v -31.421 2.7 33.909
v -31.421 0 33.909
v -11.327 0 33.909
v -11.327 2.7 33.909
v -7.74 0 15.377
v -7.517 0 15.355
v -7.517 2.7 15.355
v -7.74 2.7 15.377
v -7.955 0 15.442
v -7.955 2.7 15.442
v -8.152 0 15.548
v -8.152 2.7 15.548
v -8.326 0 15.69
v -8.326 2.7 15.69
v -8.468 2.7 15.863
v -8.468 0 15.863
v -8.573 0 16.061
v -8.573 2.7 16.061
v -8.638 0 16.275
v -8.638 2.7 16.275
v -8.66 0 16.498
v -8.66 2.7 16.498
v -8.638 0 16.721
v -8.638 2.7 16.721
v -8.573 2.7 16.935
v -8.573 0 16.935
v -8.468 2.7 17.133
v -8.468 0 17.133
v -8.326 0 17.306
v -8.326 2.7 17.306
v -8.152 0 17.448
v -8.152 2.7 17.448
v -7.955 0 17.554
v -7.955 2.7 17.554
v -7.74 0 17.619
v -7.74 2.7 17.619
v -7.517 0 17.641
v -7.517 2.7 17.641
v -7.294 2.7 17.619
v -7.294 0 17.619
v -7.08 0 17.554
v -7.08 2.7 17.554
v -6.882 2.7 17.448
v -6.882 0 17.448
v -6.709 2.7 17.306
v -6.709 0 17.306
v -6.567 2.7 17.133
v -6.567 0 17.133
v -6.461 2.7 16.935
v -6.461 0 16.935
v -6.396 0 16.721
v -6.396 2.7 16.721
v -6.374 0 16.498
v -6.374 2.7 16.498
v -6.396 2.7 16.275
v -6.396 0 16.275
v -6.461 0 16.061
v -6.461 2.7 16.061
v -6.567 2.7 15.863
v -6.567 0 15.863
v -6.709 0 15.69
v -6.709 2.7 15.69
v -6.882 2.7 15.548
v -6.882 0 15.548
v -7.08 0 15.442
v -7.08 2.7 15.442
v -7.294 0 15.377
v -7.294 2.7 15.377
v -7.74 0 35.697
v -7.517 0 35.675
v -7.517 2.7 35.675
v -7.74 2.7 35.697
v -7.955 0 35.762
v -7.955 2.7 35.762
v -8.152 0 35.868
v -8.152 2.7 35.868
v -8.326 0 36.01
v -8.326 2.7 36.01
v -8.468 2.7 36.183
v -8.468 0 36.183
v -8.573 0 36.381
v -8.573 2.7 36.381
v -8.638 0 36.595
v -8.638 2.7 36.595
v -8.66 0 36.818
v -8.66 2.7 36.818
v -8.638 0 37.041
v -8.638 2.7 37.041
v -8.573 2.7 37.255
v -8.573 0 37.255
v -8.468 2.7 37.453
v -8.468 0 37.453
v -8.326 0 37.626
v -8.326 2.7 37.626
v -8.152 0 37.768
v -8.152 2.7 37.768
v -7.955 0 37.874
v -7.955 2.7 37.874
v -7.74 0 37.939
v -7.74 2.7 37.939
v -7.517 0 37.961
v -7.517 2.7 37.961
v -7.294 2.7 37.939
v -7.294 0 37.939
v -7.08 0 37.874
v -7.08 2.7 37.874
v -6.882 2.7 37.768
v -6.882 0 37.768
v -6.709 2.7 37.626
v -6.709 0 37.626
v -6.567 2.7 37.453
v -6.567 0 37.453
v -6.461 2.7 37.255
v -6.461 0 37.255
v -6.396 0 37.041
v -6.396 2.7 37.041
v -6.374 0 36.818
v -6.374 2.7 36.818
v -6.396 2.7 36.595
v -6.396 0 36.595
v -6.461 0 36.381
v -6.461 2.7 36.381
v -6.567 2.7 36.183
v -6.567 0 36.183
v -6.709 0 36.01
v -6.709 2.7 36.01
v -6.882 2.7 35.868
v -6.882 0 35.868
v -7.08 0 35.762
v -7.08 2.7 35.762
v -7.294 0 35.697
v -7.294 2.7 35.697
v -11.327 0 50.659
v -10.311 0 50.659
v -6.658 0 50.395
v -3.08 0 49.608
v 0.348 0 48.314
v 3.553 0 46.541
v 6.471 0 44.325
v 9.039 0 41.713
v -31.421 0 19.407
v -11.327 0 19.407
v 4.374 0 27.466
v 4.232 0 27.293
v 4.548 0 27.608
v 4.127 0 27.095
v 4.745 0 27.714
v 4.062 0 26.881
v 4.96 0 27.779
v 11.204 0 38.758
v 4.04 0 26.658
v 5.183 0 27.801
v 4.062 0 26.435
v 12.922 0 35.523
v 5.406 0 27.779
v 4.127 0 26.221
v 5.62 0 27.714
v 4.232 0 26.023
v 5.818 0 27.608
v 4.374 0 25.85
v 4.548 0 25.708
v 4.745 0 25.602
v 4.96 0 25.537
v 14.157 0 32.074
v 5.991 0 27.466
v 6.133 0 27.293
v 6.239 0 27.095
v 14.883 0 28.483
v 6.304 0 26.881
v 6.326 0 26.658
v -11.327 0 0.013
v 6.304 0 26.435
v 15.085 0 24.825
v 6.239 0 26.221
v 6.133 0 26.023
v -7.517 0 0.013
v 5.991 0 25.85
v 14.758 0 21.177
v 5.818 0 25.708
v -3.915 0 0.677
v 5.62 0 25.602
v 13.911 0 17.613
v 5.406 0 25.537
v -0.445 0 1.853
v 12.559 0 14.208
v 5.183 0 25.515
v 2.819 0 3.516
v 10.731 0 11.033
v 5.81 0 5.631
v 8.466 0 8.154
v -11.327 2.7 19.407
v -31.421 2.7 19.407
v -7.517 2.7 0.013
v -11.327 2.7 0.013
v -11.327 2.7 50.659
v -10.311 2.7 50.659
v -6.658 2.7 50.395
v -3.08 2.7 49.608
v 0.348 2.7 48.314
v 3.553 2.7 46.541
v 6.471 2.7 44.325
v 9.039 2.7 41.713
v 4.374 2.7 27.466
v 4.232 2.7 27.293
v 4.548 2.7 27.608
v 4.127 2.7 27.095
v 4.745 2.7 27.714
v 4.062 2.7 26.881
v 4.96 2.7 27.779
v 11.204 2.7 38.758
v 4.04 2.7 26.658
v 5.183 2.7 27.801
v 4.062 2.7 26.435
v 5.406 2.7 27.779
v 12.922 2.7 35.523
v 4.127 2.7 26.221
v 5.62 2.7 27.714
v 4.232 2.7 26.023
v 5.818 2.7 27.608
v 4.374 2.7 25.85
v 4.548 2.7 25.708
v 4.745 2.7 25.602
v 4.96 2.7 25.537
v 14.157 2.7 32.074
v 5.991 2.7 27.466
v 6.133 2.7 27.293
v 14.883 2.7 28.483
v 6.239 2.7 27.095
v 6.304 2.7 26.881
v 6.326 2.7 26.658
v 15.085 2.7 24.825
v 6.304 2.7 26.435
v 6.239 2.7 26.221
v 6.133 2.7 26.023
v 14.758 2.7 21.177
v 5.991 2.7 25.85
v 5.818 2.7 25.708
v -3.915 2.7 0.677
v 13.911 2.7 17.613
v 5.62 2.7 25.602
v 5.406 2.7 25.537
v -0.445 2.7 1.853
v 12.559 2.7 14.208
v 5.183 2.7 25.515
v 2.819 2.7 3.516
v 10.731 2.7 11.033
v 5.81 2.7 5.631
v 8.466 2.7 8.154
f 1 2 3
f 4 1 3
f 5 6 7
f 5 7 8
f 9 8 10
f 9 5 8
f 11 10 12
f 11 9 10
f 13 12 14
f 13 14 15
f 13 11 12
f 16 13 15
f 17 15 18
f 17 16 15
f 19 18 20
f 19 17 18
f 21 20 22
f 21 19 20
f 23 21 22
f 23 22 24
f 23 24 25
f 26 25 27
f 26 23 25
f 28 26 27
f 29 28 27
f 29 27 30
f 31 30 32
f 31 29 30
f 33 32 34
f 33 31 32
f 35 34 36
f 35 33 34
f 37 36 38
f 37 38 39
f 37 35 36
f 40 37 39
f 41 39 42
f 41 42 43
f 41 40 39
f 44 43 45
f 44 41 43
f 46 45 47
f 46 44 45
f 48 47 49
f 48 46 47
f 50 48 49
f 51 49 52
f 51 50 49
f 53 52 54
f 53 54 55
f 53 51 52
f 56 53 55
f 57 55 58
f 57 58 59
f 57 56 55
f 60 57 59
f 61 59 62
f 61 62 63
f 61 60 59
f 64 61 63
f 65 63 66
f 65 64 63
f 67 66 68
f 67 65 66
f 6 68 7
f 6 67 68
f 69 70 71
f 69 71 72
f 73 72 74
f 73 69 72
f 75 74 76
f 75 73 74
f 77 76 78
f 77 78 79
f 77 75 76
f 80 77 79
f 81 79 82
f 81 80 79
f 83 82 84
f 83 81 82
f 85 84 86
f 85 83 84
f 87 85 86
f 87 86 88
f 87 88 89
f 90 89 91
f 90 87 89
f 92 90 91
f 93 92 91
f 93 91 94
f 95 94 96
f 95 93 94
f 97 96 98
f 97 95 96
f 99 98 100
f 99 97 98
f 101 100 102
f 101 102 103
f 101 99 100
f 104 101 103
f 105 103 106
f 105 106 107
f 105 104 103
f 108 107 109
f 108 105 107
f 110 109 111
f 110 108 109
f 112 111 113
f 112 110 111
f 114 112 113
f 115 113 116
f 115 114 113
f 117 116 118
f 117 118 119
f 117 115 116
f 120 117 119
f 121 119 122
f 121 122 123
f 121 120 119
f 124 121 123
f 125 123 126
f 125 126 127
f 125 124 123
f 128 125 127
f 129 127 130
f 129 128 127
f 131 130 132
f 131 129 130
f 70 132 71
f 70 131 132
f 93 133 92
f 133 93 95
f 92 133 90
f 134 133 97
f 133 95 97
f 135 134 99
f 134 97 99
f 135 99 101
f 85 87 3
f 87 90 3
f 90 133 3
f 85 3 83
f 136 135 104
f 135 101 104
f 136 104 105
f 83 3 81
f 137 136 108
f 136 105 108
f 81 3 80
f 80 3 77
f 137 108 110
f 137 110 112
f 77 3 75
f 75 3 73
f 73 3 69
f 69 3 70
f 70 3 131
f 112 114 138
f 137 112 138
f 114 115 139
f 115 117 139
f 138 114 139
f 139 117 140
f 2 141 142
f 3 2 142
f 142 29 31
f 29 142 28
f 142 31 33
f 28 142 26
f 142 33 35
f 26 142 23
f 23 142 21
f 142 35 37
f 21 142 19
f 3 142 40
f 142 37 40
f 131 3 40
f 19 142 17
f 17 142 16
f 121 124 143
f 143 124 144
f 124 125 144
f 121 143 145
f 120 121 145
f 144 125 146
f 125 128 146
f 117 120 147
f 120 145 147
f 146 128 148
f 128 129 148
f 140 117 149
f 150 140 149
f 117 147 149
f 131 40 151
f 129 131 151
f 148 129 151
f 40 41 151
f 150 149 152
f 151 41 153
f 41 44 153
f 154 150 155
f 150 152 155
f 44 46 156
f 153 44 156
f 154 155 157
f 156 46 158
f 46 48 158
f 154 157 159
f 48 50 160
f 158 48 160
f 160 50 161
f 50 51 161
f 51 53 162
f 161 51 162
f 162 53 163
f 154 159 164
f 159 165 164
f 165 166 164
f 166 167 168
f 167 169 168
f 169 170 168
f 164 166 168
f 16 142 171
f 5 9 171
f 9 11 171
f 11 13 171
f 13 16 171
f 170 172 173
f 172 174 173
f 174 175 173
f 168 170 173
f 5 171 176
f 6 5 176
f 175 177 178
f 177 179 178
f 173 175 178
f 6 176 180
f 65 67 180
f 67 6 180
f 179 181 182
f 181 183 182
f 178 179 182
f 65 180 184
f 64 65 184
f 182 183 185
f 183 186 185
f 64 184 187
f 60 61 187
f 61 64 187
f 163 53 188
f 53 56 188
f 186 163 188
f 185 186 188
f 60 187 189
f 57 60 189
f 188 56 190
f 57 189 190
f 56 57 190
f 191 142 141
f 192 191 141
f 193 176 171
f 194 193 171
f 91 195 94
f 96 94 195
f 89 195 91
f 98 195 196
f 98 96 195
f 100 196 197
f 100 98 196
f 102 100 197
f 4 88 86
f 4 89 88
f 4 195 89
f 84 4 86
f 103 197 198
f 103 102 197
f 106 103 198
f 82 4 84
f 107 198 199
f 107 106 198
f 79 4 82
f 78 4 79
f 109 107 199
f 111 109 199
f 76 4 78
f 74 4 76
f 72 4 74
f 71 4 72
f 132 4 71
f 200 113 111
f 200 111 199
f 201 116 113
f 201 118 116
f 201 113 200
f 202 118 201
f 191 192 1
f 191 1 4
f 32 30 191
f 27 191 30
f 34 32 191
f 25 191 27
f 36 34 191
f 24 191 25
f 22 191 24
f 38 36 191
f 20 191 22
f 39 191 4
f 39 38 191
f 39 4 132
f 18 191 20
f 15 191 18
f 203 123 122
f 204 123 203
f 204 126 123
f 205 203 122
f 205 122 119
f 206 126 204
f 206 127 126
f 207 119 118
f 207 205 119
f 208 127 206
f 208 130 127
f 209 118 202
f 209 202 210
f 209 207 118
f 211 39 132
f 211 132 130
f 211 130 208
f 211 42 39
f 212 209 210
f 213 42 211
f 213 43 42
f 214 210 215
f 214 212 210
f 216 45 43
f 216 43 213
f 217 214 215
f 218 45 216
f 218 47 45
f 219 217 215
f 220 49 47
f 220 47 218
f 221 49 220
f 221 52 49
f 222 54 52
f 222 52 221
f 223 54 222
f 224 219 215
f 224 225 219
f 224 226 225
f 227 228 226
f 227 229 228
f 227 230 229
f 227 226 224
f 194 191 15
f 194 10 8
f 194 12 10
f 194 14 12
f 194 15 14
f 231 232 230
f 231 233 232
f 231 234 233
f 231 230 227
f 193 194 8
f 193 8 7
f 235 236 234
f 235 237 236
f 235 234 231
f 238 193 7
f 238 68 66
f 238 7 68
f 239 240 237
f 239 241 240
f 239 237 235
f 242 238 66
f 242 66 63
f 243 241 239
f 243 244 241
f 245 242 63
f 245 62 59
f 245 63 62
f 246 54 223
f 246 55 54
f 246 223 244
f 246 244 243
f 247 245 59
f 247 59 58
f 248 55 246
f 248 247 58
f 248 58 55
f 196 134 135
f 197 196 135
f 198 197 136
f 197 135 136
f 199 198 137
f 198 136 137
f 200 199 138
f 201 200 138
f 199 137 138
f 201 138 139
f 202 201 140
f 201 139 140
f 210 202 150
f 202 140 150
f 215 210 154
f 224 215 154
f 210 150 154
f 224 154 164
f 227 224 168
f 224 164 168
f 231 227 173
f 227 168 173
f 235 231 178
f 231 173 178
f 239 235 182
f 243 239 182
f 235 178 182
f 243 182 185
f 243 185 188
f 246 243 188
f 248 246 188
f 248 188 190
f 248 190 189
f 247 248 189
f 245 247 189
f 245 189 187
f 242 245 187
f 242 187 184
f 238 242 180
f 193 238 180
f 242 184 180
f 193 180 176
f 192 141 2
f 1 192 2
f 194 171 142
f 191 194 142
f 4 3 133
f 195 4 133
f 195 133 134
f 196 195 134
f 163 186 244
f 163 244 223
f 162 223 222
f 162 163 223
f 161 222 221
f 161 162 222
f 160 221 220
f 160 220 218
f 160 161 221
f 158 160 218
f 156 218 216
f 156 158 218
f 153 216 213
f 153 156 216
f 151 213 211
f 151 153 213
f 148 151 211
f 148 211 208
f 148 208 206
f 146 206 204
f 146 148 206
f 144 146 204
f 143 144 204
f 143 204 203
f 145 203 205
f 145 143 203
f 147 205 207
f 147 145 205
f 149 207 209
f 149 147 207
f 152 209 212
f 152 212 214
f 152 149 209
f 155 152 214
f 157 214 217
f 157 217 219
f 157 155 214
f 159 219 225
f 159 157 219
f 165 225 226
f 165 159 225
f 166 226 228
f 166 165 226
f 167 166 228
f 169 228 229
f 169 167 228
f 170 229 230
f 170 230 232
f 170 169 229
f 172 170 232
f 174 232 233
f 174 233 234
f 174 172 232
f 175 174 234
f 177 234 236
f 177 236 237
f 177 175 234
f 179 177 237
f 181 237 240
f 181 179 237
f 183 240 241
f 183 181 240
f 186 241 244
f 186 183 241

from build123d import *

# Parameters (mm, degrees)
SKETCH1_R           = 1.143
BOSS_EXTRUDE1_DEPTH = 2.7


with BuildPart() as part:
    # Sketch1 → Boss-Extrude1 (new body)
    with BuildSketch(Plane(origin=(0, 0, 0), x_dir=(1, 0, 0), z_dir=(0, 1, 0))):
        with BuildLine():
            Line((-11.327327395, -33.908852397), (-11.327327395, -50.658852397))
            Line((-11.327327395, -50.658852397), (-10.311327339, -50.658852397))
            ThreePointArc((-10.311327339, -50.658852397), (15.050108966, -26.657976598), (-7.517327395, -0.012990077))
            Line((-7.517327395, -0.012990077), (-11.327327395, -0.012990077))
            Line((-11.327327395, -0.012990077), (-11.327327395, -19.407100798))
            Line((-11.327327395, -19.407100798), (-31.421327339, -19.407100798))
            Line((-31.421327339, -19.407100798), (-31.421327339, -33.908852397))
            Line((-31.421327339, -33.908852397), (-11.327327395, -33.908852397))
        make_face()
        with Locations(Location((-7.517327395, -16.497976598, 0), (0, 0, 90))):
            Circle(SKETCH1_R, mode=Mode.SUBTRACT)
        with Locations(Location((-7.517327395, -36.817976598, 0), (0, 0, 90))):
            Circle(SKETCH1_R, mode=Mode.SUBTRACT)
        with Locations(Location((5.182672605, -26.657976598, 0), (0, 0, 90))):
            Circle(SKETCH1_R, mode=Mode.SUBTRACT)
    extrude(amount=BOSS_EXTRUDE1_DEPTH)


solid = part.part
